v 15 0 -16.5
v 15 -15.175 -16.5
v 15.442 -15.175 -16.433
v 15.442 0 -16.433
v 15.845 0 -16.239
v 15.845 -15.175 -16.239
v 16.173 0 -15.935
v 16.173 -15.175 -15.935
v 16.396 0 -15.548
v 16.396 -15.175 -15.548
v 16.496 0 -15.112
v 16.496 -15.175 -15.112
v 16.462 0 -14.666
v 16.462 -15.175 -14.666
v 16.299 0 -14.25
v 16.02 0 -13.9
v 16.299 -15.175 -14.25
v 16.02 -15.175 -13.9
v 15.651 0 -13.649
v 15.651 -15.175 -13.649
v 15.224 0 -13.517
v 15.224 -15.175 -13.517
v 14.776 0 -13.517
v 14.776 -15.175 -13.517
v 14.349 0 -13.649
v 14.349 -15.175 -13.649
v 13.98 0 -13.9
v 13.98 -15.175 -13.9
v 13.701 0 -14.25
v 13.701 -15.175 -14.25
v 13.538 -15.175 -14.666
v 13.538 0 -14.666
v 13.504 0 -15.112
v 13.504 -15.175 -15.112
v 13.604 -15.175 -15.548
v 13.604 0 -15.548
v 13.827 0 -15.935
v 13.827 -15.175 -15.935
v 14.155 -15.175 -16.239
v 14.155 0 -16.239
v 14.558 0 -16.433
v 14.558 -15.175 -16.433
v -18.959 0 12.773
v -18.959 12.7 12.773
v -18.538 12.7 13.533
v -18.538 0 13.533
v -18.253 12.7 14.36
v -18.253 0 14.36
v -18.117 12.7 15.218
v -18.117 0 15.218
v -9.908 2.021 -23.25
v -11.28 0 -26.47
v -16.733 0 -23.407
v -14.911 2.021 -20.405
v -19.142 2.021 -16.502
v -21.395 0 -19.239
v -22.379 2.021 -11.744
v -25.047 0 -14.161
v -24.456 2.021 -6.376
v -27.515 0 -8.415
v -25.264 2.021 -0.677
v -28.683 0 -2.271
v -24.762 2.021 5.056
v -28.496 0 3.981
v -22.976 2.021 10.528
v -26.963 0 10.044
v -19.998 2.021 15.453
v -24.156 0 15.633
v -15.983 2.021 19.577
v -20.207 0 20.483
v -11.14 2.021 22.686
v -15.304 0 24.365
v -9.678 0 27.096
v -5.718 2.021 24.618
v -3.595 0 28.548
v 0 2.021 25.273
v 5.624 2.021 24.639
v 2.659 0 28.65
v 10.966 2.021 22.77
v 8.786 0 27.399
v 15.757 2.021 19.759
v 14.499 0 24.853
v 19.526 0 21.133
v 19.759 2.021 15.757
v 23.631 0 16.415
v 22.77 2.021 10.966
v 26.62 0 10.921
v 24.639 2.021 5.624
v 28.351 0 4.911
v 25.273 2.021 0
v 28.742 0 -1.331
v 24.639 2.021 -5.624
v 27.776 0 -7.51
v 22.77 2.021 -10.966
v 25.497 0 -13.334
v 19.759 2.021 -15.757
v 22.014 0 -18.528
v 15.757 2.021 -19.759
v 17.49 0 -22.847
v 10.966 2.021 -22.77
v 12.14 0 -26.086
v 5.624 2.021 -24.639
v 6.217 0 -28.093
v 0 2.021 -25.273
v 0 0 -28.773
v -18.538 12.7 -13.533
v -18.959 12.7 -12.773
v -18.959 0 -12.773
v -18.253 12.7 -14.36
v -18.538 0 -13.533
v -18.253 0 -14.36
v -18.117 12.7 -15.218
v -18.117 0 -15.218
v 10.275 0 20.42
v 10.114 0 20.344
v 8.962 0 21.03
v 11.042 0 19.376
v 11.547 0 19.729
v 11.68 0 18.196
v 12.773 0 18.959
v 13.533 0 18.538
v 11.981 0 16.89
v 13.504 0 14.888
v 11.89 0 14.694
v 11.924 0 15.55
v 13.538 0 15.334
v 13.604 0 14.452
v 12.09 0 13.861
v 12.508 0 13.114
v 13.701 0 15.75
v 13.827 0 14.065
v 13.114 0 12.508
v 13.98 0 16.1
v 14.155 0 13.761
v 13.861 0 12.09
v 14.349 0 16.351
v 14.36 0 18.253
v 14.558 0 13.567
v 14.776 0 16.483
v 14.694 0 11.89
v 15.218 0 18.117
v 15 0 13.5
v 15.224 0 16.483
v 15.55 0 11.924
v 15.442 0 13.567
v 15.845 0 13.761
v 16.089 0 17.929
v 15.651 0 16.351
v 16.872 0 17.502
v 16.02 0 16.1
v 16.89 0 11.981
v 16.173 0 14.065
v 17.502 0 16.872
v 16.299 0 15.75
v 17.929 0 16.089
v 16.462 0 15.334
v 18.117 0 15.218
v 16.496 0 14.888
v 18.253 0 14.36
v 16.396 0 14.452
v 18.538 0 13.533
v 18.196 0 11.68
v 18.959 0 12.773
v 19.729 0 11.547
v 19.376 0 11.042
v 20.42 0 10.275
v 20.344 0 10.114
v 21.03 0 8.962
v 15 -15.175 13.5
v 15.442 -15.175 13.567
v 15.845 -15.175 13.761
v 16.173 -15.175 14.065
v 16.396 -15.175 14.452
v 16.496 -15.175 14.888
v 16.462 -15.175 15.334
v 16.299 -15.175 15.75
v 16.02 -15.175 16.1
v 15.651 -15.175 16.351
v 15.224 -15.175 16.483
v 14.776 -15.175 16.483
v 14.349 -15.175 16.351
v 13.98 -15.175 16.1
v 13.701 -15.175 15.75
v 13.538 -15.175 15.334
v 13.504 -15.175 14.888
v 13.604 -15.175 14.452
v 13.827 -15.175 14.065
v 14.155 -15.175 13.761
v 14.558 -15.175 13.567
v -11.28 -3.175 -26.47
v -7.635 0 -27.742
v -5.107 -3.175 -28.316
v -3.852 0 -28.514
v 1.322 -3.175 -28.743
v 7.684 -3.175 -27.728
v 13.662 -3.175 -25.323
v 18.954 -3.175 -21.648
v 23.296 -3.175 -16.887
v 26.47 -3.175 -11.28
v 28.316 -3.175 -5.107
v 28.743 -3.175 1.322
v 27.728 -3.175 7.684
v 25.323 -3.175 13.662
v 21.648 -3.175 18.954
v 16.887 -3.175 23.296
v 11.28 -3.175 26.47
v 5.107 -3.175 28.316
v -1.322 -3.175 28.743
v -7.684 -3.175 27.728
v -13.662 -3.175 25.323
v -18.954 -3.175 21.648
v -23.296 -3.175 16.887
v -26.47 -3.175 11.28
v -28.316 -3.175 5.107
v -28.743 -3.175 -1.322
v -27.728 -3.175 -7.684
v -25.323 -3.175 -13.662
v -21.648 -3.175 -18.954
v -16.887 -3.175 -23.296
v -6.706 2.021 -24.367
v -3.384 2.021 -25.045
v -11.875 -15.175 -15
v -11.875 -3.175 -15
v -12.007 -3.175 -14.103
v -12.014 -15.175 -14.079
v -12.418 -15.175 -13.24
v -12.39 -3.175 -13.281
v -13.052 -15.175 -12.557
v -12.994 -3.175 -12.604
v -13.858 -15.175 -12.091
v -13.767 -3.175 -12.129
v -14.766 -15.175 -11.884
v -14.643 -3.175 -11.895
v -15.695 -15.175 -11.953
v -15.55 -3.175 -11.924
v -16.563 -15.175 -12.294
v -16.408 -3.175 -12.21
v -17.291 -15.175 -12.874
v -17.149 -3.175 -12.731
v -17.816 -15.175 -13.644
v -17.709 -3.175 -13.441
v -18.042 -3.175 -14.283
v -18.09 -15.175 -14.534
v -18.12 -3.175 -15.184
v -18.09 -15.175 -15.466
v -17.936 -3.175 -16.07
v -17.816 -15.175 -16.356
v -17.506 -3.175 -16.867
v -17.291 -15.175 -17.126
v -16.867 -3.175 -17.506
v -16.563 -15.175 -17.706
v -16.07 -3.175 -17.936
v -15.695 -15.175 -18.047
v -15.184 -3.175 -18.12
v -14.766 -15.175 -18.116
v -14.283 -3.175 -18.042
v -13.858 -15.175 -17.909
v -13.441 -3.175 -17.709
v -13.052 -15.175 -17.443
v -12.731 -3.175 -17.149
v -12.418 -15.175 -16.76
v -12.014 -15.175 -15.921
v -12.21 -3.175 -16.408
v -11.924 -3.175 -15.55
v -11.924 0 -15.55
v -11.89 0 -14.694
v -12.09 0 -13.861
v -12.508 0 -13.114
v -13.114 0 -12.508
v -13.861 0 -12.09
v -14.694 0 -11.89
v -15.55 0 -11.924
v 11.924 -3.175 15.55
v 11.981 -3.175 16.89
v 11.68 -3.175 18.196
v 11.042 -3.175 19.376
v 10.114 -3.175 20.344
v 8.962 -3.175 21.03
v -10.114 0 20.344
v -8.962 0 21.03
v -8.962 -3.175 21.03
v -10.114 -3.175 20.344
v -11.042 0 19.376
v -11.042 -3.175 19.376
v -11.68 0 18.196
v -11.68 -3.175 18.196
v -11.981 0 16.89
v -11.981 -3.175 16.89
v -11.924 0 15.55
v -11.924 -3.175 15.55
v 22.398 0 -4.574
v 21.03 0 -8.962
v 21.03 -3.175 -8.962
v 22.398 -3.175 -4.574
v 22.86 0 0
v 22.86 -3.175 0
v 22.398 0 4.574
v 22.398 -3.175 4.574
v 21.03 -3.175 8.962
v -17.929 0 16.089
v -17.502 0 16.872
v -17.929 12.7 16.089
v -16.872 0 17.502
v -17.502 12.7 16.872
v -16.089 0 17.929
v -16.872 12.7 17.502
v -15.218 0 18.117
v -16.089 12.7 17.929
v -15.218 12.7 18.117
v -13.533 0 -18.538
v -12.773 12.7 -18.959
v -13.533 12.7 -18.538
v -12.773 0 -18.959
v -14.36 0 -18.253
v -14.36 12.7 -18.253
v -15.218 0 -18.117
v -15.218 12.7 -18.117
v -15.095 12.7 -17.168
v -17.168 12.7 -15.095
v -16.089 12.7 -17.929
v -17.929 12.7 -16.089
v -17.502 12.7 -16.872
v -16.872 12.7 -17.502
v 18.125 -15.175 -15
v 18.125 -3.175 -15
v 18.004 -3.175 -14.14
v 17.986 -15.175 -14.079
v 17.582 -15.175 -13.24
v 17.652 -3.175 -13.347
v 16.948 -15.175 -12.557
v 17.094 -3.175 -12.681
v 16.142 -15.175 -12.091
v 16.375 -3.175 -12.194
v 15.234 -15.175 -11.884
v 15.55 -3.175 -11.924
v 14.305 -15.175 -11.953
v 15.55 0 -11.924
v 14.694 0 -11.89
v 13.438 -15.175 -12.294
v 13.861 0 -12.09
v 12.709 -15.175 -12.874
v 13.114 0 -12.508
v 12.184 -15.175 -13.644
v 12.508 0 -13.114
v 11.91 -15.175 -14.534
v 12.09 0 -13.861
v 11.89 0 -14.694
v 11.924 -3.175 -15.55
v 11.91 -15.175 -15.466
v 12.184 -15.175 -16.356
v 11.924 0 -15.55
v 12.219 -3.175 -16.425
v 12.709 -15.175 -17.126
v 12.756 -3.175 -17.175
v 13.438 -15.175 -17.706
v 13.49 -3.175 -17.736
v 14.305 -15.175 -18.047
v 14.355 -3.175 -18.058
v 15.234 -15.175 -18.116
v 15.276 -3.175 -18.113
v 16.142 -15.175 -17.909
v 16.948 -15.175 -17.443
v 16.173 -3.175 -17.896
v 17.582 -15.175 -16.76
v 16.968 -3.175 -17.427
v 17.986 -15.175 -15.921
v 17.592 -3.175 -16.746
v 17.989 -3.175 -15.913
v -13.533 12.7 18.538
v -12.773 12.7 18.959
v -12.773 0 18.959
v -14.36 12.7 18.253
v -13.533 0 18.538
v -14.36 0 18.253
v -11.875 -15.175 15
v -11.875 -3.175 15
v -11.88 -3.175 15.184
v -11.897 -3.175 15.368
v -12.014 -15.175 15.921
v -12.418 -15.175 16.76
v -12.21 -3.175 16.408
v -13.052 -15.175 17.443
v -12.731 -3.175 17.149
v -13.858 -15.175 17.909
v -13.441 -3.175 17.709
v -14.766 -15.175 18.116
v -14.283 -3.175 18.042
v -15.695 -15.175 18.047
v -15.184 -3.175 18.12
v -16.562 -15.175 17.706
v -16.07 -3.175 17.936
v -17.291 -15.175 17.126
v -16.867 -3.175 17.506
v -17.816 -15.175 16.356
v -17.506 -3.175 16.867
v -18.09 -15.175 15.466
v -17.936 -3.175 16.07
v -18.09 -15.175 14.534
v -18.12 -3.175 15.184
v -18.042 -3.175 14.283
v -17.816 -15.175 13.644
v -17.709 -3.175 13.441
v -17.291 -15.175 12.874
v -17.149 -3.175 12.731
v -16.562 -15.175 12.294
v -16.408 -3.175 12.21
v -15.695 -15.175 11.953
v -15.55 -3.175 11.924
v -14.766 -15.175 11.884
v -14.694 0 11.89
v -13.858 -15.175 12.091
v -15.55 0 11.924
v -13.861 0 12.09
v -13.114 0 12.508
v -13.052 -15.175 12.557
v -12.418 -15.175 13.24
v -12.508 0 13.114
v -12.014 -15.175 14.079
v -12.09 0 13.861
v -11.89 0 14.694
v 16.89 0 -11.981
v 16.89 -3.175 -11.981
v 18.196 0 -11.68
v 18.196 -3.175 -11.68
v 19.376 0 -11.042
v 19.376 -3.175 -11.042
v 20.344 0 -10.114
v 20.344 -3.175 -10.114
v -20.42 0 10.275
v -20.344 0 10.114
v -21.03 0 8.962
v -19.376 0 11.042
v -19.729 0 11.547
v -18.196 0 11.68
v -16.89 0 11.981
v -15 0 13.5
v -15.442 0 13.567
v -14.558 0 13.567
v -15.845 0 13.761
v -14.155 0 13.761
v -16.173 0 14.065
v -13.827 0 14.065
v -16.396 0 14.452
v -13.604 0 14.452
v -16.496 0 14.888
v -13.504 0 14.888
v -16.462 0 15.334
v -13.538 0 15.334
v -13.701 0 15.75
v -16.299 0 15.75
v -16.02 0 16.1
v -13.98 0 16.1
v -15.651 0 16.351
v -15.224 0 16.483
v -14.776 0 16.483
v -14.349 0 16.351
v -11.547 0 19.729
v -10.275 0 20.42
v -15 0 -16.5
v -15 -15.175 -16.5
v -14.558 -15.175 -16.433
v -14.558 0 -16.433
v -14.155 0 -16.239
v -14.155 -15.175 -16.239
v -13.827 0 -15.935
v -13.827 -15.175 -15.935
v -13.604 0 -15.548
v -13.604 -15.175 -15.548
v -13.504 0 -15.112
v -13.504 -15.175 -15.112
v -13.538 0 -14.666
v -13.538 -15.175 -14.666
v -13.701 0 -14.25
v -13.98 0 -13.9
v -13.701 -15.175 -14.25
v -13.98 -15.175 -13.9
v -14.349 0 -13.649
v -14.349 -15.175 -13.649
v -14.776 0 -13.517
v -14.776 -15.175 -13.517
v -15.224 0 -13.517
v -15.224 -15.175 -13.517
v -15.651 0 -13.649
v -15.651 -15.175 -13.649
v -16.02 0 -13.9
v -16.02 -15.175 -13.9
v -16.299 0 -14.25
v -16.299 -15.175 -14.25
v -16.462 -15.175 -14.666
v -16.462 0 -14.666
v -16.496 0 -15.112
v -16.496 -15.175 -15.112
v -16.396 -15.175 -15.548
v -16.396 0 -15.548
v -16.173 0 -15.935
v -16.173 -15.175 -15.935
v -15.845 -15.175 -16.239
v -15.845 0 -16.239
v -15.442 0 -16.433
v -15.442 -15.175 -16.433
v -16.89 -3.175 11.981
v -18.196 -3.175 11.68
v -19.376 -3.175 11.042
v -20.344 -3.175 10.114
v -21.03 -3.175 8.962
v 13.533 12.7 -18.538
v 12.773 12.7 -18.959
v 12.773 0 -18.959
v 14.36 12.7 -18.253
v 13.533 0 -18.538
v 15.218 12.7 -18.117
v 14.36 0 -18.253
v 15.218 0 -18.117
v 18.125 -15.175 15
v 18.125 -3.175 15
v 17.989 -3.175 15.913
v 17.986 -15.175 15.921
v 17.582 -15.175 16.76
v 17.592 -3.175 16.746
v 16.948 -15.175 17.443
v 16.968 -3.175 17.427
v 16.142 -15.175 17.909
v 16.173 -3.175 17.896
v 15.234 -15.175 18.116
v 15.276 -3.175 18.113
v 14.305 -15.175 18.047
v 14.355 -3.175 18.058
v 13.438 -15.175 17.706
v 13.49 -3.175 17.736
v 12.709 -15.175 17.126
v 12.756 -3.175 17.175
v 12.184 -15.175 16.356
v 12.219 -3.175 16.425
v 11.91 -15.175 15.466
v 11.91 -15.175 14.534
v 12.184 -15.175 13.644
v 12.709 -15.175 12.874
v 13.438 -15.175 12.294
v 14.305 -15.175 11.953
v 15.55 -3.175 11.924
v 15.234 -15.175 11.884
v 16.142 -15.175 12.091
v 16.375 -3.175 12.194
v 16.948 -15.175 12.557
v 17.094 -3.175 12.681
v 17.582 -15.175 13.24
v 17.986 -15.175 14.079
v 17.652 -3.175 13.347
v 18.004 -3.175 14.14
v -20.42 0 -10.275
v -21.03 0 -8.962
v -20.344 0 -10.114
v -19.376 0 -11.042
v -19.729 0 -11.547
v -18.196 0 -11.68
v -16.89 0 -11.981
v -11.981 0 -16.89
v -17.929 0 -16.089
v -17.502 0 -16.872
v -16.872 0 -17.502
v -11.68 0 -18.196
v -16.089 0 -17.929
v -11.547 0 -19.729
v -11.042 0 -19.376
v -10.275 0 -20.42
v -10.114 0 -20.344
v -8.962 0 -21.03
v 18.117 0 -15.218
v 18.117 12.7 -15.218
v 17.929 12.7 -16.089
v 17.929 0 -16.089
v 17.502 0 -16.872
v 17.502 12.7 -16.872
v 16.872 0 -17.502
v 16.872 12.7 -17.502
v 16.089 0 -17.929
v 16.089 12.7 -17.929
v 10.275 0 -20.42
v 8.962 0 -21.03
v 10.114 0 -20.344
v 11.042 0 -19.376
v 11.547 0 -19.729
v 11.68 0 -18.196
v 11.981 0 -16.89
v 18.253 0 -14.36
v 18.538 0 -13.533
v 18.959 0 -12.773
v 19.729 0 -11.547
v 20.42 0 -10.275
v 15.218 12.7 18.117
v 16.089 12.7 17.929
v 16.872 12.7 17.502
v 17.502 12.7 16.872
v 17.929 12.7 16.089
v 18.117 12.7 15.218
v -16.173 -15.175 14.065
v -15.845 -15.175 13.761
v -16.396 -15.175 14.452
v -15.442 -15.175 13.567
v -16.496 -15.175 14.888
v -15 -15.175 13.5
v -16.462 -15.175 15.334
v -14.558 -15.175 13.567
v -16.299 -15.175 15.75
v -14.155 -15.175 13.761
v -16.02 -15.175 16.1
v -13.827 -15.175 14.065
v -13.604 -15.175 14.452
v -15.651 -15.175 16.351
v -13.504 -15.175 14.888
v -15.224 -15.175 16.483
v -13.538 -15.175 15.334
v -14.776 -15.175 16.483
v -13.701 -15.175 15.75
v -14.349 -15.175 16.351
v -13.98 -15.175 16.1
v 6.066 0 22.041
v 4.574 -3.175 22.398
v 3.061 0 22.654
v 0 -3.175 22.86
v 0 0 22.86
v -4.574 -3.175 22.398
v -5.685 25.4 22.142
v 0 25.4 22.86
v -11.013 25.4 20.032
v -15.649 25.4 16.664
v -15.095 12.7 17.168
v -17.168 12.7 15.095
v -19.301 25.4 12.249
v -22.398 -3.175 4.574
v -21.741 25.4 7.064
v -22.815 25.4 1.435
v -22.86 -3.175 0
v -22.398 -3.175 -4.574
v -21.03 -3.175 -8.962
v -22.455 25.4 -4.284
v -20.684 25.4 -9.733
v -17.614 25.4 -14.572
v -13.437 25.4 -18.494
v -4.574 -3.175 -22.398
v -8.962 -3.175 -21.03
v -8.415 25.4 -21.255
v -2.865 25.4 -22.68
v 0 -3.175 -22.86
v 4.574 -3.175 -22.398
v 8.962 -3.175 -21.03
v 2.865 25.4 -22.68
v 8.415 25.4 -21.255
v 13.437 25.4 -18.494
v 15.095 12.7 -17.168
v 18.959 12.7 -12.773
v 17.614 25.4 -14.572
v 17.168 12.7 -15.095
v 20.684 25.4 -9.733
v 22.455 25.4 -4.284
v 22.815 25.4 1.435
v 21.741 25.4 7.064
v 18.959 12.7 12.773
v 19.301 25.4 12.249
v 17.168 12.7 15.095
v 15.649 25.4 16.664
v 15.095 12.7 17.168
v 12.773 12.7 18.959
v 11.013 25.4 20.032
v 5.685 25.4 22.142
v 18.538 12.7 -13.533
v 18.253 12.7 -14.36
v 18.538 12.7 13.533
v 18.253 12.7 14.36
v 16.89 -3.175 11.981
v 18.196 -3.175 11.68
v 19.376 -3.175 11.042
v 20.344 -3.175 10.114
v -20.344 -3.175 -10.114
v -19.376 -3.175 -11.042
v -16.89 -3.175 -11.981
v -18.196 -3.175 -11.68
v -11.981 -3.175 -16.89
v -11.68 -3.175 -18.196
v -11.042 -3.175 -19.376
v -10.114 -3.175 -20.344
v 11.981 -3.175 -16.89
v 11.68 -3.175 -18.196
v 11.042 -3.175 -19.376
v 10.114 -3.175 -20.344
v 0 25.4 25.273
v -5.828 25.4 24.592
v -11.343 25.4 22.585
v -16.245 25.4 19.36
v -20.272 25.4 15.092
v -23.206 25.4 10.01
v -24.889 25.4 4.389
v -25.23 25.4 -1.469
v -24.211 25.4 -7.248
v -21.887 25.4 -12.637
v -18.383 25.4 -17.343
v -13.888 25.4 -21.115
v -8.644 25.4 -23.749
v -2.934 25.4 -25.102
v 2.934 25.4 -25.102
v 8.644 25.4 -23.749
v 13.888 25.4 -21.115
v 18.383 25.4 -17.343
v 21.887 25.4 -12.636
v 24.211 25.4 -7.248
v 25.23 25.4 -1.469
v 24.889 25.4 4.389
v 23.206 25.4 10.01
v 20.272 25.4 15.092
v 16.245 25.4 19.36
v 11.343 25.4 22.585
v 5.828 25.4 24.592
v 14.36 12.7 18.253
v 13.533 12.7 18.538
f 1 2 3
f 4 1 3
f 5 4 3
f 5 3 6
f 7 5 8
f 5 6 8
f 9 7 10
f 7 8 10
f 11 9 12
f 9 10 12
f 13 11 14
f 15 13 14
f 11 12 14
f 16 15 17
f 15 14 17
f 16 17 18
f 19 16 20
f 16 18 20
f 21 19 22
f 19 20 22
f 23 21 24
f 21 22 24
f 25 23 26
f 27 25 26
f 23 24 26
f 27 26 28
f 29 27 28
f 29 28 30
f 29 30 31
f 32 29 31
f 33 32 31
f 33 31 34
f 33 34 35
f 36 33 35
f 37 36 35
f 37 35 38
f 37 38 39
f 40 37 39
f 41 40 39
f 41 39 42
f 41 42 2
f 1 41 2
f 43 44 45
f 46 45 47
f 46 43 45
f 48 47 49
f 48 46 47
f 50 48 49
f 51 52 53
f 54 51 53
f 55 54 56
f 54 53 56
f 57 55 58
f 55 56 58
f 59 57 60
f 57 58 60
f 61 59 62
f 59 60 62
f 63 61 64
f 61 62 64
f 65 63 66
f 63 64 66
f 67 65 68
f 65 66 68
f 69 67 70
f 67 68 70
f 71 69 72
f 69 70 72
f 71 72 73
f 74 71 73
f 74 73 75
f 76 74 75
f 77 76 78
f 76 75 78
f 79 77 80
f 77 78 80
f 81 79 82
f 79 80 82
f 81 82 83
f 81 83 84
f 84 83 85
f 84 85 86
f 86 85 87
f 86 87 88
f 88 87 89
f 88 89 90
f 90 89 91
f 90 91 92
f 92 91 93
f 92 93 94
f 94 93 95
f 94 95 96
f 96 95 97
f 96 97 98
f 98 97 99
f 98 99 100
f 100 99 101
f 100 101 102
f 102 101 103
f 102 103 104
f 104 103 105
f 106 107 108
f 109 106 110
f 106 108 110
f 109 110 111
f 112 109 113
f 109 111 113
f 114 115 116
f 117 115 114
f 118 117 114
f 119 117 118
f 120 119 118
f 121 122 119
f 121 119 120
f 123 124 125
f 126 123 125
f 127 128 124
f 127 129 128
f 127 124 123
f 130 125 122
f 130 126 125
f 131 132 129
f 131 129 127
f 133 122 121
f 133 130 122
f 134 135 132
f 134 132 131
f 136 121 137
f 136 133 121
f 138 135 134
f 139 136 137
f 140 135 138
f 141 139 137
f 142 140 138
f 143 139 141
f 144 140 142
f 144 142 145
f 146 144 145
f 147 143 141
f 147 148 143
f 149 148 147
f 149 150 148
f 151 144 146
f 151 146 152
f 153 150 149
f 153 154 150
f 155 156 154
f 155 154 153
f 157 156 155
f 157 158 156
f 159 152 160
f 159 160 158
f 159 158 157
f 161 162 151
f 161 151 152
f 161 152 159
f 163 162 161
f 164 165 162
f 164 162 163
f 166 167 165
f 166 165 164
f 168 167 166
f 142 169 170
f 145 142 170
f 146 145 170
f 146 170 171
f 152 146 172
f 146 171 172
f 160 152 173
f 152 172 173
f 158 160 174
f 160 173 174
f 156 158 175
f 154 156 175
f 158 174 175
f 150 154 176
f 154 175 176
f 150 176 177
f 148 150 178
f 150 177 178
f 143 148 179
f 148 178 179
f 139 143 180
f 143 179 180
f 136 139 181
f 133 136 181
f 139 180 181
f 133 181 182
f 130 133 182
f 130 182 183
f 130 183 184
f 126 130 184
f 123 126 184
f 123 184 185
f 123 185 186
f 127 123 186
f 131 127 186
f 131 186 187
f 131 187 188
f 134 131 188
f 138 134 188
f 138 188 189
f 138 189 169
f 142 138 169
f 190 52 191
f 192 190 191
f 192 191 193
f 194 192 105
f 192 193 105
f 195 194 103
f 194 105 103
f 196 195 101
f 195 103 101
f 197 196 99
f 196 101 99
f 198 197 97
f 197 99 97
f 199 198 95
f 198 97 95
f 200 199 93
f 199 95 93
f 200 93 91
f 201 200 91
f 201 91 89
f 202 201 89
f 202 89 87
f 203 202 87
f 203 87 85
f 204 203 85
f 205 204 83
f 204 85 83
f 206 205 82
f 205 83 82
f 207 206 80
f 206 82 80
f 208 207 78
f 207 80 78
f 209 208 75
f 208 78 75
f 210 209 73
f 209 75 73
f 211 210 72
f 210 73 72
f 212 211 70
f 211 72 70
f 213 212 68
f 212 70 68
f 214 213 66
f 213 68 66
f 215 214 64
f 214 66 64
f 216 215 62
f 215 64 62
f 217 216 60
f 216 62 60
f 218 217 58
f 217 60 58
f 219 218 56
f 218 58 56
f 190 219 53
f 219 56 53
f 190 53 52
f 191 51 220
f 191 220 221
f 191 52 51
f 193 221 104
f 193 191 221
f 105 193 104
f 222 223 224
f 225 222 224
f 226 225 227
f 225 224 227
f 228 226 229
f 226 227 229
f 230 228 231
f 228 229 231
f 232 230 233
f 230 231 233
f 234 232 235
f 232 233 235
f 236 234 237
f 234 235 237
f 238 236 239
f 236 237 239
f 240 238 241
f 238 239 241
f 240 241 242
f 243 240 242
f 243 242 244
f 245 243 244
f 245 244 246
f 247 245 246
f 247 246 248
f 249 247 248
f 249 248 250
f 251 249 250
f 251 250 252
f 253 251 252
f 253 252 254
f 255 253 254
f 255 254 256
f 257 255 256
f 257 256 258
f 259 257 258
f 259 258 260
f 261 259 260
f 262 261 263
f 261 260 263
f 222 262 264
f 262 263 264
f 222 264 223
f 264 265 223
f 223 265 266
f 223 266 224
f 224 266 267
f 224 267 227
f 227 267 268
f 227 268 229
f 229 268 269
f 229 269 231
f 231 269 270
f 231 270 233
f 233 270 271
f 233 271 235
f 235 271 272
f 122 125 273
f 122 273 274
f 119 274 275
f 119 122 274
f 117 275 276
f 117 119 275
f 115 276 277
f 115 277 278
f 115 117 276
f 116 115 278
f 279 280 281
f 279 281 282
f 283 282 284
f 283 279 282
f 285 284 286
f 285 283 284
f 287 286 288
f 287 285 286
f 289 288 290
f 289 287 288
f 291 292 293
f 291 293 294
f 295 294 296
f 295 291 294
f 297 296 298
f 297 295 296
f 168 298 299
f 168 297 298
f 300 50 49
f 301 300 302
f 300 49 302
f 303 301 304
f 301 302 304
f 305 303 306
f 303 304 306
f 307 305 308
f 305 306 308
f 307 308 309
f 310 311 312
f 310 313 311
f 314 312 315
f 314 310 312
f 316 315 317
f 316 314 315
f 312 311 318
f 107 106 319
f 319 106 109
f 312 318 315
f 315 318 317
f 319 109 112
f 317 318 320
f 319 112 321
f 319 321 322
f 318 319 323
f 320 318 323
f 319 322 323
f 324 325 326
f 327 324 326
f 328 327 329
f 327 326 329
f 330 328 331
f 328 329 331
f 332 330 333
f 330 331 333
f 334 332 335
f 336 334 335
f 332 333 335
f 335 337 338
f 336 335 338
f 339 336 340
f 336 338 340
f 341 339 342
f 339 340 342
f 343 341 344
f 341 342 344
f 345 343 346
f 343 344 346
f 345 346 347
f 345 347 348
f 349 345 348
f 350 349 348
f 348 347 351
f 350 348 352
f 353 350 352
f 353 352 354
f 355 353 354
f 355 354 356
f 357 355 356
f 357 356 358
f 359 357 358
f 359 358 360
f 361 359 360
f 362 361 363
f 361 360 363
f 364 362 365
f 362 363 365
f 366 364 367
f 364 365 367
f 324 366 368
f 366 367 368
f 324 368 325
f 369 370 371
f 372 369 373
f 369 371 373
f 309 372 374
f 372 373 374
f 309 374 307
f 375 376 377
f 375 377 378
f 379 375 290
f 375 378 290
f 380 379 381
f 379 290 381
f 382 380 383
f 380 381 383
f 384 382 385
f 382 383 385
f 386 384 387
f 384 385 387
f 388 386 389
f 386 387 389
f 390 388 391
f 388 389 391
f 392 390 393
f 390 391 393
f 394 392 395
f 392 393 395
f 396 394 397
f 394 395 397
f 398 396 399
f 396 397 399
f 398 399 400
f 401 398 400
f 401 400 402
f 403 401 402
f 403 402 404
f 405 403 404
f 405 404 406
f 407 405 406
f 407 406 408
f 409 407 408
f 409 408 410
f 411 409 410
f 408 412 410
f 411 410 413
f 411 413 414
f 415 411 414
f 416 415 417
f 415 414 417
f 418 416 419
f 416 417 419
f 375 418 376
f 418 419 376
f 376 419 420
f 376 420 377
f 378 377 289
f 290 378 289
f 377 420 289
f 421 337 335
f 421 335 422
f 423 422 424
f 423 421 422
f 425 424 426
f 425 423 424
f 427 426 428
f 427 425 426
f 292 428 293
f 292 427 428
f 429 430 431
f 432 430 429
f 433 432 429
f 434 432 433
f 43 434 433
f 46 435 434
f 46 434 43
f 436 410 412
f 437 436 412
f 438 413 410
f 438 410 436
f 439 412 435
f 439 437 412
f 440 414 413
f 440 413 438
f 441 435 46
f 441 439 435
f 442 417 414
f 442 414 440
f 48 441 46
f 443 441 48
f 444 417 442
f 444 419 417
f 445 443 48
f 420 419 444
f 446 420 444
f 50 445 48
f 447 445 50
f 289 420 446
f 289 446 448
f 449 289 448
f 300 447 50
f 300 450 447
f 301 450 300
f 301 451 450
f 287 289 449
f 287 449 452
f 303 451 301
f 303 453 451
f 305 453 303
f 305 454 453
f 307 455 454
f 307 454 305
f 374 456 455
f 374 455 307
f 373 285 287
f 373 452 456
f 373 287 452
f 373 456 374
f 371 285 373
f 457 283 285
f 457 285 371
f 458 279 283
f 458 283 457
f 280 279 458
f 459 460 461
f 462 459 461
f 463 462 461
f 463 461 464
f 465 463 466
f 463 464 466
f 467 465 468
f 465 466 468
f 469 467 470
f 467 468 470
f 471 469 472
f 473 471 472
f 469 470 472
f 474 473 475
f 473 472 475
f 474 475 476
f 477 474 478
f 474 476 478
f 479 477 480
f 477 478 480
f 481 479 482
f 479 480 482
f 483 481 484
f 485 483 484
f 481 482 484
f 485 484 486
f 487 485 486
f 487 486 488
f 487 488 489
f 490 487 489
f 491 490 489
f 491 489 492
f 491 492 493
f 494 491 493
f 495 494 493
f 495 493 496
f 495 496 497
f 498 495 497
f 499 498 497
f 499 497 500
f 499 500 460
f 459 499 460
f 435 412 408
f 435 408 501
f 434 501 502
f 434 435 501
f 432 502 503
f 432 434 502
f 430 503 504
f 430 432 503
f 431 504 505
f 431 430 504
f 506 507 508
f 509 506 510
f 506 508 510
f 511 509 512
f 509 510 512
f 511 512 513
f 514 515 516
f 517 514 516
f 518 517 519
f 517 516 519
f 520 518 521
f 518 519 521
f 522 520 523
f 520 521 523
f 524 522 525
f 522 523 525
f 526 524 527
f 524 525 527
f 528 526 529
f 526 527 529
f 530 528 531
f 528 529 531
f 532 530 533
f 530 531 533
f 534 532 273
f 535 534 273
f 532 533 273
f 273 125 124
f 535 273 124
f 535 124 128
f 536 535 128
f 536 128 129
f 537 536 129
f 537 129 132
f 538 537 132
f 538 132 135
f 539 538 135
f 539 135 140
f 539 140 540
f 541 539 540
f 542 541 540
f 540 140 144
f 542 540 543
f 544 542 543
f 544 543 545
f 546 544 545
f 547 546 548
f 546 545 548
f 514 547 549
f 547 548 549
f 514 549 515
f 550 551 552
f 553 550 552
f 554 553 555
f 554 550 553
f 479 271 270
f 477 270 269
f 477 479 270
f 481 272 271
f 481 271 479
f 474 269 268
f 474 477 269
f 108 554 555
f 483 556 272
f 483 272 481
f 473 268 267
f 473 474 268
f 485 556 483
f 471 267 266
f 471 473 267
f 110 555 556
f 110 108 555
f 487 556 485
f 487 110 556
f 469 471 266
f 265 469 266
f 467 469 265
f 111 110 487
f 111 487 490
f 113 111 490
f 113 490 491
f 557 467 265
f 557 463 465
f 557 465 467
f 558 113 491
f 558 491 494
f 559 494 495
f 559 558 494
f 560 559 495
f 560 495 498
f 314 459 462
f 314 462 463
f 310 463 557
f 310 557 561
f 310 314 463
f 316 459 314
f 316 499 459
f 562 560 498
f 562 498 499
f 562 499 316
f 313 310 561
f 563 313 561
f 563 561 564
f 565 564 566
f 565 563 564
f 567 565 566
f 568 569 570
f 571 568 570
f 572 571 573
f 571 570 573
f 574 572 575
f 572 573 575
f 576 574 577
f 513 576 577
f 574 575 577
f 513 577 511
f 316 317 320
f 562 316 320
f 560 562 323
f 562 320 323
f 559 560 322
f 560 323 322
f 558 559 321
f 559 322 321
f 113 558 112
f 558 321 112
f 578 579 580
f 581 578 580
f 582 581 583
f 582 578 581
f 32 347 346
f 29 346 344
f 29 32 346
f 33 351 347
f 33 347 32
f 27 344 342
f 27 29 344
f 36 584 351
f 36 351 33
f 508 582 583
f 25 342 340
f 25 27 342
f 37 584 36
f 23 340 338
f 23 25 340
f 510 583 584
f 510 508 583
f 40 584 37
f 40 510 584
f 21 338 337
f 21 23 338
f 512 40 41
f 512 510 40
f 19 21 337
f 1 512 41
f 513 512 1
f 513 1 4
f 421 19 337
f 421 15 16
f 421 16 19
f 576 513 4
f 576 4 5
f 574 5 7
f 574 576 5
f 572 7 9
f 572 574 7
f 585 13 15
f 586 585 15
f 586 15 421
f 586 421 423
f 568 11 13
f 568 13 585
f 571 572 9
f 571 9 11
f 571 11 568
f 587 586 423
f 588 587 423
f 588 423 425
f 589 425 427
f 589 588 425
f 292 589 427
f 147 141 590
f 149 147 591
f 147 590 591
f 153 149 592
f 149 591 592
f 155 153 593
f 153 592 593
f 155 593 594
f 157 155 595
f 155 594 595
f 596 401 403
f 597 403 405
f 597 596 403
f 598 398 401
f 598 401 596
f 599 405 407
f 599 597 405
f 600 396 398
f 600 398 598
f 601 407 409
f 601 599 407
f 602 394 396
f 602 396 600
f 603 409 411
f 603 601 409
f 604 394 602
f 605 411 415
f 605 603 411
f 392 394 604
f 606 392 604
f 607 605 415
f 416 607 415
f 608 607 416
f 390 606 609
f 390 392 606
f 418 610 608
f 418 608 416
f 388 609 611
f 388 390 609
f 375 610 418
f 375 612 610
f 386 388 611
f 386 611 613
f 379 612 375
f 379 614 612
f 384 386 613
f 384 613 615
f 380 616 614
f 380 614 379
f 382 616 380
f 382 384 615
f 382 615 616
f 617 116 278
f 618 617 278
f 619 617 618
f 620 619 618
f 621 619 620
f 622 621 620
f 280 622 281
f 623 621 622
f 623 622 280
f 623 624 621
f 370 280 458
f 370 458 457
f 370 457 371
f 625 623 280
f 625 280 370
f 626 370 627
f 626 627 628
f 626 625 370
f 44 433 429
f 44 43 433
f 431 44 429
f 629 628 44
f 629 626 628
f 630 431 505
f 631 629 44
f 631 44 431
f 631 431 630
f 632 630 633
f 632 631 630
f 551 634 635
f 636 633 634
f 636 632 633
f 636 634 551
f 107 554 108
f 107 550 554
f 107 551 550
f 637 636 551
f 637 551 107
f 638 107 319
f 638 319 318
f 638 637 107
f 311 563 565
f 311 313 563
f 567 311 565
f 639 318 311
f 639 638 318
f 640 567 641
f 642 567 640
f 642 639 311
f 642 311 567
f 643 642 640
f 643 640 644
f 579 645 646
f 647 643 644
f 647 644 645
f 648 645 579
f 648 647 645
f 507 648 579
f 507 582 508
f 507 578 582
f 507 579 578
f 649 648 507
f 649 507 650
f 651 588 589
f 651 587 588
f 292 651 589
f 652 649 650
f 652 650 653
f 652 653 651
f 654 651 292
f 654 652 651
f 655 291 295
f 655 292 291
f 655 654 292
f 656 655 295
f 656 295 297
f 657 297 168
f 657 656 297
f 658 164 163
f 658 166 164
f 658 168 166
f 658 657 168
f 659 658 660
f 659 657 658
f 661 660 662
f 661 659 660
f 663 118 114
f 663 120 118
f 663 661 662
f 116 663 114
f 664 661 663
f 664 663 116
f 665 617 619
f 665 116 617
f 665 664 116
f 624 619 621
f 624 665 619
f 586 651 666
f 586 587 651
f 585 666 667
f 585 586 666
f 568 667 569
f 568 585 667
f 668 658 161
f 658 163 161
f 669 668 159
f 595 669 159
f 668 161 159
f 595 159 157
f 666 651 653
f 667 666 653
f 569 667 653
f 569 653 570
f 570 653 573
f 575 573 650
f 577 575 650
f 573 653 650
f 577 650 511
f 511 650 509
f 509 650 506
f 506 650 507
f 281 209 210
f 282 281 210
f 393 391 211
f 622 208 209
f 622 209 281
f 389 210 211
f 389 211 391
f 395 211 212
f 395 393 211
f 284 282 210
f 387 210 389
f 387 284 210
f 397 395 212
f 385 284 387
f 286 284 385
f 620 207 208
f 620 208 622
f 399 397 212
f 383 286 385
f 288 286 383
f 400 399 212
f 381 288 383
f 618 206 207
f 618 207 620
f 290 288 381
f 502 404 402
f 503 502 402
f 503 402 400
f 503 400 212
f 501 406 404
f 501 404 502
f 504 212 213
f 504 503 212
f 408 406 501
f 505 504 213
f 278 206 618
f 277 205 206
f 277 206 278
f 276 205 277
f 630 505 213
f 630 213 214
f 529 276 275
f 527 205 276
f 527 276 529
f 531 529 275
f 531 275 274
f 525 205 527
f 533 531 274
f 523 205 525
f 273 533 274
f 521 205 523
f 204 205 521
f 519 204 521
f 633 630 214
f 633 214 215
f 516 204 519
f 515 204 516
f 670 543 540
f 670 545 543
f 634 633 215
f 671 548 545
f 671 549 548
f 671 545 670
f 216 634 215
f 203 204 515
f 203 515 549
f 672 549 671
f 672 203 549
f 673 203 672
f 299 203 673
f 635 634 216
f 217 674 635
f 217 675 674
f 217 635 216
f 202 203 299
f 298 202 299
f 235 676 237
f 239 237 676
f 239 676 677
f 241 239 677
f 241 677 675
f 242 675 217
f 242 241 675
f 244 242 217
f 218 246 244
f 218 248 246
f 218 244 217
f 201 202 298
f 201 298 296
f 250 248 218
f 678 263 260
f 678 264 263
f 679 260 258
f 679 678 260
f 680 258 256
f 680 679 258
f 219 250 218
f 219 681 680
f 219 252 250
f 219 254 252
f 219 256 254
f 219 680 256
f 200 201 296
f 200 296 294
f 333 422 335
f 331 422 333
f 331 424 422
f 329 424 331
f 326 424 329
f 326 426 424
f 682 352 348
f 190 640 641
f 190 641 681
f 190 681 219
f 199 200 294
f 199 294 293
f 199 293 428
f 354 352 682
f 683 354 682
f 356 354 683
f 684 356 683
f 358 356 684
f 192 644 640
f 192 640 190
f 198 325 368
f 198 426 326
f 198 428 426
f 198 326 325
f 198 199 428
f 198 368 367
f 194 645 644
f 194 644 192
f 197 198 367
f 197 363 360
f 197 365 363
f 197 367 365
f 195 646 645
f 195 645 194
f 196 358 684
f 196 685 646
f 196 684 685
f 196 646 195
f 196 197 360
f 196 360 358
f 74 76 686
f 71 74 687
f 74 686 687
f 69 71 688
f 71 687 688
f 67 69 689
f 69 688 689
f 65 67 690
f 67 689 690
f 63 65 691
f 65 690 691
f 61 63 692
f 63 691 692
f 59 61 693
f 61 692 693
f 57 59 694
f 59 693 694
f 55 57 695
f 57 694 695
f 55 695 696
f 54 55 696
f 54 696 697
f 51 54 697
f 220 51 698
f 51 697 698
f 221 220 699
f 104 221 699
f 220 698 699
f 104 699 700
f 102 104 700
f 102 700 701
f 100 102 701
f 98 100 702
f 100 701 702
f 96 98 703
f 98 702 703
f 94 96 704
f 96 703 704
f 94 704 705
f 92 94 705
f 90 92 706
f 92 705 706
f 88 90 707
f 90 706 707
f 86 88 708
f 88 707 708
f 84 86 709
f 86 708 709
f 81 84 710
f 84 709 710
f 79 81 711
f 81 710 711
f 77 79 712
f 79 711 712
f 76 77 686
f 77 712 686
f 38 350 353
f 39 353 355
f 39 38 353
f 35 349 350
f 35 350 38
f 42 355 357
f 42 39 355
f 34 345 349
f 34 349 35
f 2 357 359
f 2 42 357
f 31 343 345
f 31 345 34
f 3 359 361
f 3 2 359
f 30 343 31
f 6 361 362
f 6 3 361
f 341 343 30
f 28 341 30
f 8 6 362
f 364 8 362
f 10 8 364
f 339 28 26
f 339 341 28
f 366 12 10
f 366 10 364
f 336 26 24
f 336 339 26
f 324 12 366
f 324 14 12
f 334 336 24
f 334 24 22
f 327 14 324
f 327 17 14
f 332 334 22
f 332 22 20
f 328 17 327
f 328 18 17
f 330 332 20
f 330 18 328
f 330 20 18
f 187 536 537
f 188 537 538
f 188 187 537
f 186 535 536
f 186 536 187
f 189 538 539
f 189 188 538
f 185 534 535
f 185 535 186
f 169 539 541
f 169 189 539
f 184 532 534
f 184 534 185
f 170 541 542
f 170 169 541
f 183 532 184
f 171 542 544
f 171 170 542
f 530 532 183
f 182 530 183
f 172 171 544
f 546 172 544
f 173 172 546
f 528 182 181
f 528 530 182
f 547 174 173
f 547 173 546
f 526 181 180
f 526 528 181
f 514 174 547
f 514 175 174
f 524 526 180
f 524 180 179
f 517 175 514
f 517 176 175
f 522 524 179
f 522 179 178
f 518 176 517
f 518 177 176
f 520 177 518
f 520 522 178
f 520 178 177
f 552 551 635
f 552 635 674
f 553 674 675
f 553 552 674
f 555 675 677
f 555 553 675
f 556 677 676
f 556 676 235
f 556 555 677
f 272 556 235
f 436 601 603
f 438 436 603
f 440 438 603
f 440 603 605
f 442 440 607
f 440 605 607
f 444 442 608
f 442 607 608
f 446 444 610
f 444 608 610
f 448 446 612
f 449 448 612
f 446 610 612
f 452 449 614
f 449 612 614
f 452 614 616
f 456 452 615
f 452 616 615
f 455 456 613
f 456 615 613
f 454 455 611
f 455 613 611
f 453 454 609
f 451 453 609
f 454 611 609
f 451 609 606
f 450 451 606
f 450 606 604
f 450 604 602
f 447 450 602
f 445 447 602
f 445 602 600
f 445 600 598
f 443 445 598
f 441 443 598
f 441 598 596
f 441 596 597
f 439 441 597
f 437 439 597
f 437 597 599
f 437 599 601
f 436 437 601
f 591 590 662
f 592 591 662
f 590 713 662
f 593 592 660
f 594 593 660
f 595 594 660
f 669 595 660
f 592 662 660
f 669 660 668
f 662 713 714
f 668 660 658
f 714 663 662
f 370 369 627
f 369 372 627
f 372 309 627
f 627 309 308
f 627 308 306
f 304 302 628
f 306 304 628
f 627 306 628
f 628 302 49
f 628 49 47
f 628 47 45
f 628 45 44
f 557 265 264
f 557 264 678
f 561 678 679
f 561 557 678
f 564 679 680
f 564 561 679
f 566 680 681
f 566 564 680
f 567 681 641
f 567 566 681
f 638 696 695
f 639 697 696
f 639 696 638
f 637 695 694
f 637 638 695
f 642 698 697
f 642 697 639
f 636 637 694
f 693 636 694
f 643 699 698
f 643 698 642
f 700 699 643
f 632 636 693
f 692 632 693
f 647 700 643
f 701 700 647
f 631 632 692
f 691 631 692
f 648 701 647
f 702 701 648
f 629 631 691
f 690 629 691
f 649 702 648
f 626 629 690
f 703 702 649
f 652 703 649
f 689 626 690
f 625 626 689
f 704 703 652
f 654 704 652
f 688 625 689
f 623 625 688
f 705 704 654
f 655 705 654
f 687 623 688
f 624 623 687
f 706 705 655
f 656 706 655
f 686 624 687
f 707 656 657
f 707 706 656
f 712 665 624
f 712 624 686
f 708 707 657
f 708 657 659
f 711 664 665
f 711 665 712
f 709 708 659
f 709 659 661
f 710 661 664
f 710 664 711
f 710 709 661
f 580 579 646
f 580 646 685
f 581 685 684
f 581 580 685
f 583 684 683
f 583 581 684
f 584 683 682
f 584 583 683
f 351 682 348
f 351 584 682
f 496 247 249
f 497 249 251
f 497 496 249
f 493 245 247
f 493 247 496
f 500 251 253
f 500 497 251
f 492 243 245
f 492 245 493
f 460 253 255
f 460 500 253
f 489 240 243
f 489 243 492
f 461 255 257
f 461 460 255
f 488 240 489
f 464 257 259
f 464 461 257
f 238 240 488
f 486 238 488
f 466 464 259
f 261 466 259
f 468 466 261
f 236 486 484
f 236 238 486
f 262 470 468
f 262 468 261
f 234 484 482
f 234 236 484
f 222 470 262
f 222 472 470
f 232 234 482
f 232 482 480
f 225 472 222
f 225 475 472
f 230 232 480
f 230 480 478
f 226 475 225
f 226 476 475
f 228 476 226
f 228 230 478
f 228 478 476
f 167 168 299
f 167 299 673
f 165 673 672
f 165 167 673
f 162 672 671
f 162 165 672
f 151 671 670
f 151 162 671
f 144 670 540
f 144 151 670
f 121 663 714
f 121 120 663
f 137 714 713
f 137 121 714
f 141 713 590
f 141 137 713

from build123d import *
from build123d.topology import SkipClean

# Parameters (mm, degrees)
SKETCH1_R               = 25.273
SKETCH1_R_2             = 22.86
BOSS_EXTRUDE1_DEPTH     = 25.4
SKETCH6_R               = 3.1250000000000004
SKETCH6_R_2             = 3.125000000000001
SKETCH6_R_3             = 3.125000000000005
BOSS_EXTRUDE2_DEPTH     = 3.175
SKETCH5_R               = 3.1250000000000004
SKETCH5_R_2             = 3.125000000000004
SKETCH5_R_3             = 3.125000000000001
CUT_EXTRUDE1_DEPTH      = 12.7
SKETCH10_R              = 25.273
BOSS_EXTRUDE3_DEPTH     = 3.175
CUT_EXTRUDE2_DEPTH      = 44.84756615822593
CUT_EXTRUDE2_DEPTH_BACK = 44.84756615822593
SKETCH3_R               = 1.2500000000000007
FILLET1_R               = 5
FILLET3_R               = 5
SKETCH11_R              = 1.2500000000000013
BOSS_EXTRUDE4_DEPTH     = 12
SKETCH13_R              = 1.5000000000000009
SKETCH13_R_2            = 1.5000000000000002
CUT_EXTRUDE3_DEPTH      = 55.07198619539511
SKETCH14_W              = 3.5
SKETCH14_H              = 3.174999999999997
CHAMFER1_SIZE           = 2.020725942
CHAMFER1_SIZE_2         = 3.5


with BuildPart() as part:
    # Sketch1 → Boss-Extrude1 (new body)
    with BuildSketch(Plane(origin=(0, 0, 0), x_dir=(1, 0, 0), z_dir=(0, 1, 0))):
        with Locations(Location((0, 0, 0), (0, 0, 270))):
            Circle(SKETCH1_R)
        with Locations(Location((0, 0, 0), (0, 0, 270))):
            Circle(SKETCH1_R_2, mode=Mode.SUBTRACT)
    extrude(amount=BOSS_EXTRUDE1_DEPTH)

    # Sketch6 → Boss-Extrude2 (add)
    with BuildSketch(Plane.XZ):
        with Locations(Location((-15.000000000000004, 15, 0), (0, 0, 73.279468642))):
            Circle(SKETCH6_R)
        with Locations(Location((-14.999999999999996, -15.000000000000007, 0), (0, 0, 163.279468642))):
            Circle(SKETCH6_R_2)
        with Locations(Location((15.00000000000001, -14.999999999999993, 0), (0, 0, 16.720531358))):
            Circle(SKETCH6_R)
        with Locations(Location((15.000000000000004, 15, 0), (0, 0, 106.720531358))):
            Circle(SKETCH6_R_3)
    extrude(amount=BOSS_EXTRUDE2_DEPTH)

    # Sketch5 → Cut-Extrude1 (cut)
    with BuildSketch(Plane(origin=(0, 12.7, 0), x_dir=(1, 0, 0), z_dir=(0, 1, 0))):
        with Locations(Location((-14.999999999999996, 15.000000000000007, 0), (0, 0, 90))):
            Circle(SKETCH5_R)
        with Locations(Location((15.00000000000001, 14.999999999999993, 0), (0, 0, 90))):
            Circle(SKETCH5_R)
        with Locations(Location((15.000000000000004, -15, 0), (0, 0, 90))):
            Circle(SKETCH5_R_2)
        with Locations(Location((-15.000000000000004, -15, 0), (0, 0, 90))):
            Circle(SKETCH5_R_3)
    extrude(amount=-CUT_EXTRUDE1_DEPTH, mode=Mode.SUBTRACT)


with BuildPart() as cut_extrude1_piece_1:
    # of the separate pieces the step leaves, piece 1, a body of its own (cut_extrude1_pieces)
    add(part.part.solids().sort_by_distance((0, 0, 25.273))[0])



with BuildPart() as cut_extrude1_piece_2:
    # of the separate pieces the step leaves, piece 2, a body of its own (cut_extrude1_pieces)
    add(part.part.solids().sort_by_distance((14.100925852, -3.175, 17.992873315))[0])


with BuildPart() as cut_extrude1_piece_3:
    # of the separate pieces the step leaves, piece 3, a body of its own (cut_extrude1_pieces)
    add(part.part.solids().sort_by_distance((17.992873315, -3.175, -14.100925852))[0])


with BuildPart() as cut_extrude1_piece_4:
    # of the separate pieces the step leaves, piece 4, a body of its own (cut_extrude1_pieces)
    add(part.part.solids().sort_by_distance((-17.992873315, -3.175, -14.100925852))[0])


with BuildPart() as cut_extrude1_piece_5:
    # of the separate pieces the step leaves, piece 5, a body of its own (cut_extrude1_pieces)
    add(part.part.solids().sort_by_distance((-14.100925852, -3.175, 17.992873315))[0])


with BuildPart() as cut_extrude1_piece_1_1:
    with SkipClean():  # the faces are left unmerged after this step: merging them gives an invalid solid
        add(cut_extrude1_piece_1.part)

        add(cut_extrude1_piece_2.part)  # Boss-Extrude3 merges Cut-Extrude1 piece 2

        add(cut_extrude1_piece_3.part)  # Boss-Extrude3 merges Cut-Extrude1 piece 3

        add(cut_extrude1_piece_4.part)  # Boss-Extrude3 merges Cut-Extrude1 piece 4

        add(cut_extrude1_piece_5.part)  # Boss-Extrude3 merges Cut-Extrude1 piece 5
        # Sketch10 → Boss-Extrude3 (add)
        with BuildSketch(Plane.XZ):
            with Locations(Location((0, 0, 0), (0, 0, 270))):
                Circle(SKETCH10_R)
            with BuildLine():
                ThreePointArc((-17.992873314506625, 14.100925852160042), (-22.86, -7.35e-15), (-17.992873314506618, -14.100925852160044))
                ThreePointArc((-17.992873314506618, -14.100925852160044), (-17.209708691207958, -17.209708691207968), (-14.100925852160033, -17.992873314506628))
                ThreePointArc((-14.100925852160033, -17.992873314506628), (1.155e-14, -22.86), (14.10092585216005, -17.992873314506614))
                ThreePointArc((14.10092585216005, -17.992873314506614), (17.20970869120797, -17.209708691207954), (17.99287331450663, -14.10092585216003))
                ThreePointArc((17.99287331450663, -14.10092585216003), (22.86, 2.54e-15), (17.992873314506628, 14.100925852160033))
                ThreePointArc((17.992873314506628, 14.100925852160033), (17.209708691207968, 17.209708691207965), (14.100925852160037, 17.99287331450662))
                ThreePointArc((14.100925852160037, 17.99287331450662), (-8.75e-15, 22.859999999999996), (-14.10092585216005, 17.992873314506618))
                ThreePointArc((-14.10092585216005, 17.992873314506618), (-17.20970869120796, 17.209708691207958), (-17.992873314506625, 14.100925852160042))
            make_face(mode=Mode.SUBTRACT)
        extrude(amount=BOSS_EXTRUDE3_DEPTH)

    # Sketch3 → Cut-Extrude2 (cut, two sides: drawn at the far end of the back side and taken through both)
    with BuildSketch(Plane(origin=(0, 0, 0), x_dir=(-1, 0, 0), z_dir=(0, -1, 0)).offset(-CUT_EXTRUDE2_DEPTH_BACK)):
        with Locations(Location((-15.00000000000001, 14.999999999999993, 0), (0, 0, 90))):
            Circle(SKETCH3_R)
        with Locations(Location((14.999999999999996, 15.000000000000007, 0), (0, 0, 90))):
            Circle(SKETCH3_R)
        with Locations(Location((15.000000000000004, -15, 0), (0, 0, 90))):
            Circle(SKETCH3_R)
        with Locations(Location((-15.000000000000004, -15, 0), (0, 0, 90))):
            Circle(SKETCH3_R)
    extrude(amount=CUT_EXTRUDE2_DEPTH + CUT_EXTRUDE2_DEPTH_BACK, mode=Mode.SUBTRACT)

    # Fillet1
    # the kernel refuses this fillet: 5 mm, written as the material it adds along each edge
    with BuildSketch(Plane(origin=(14.10092585215273, 0, 17.99287331450443), x_dir=(-0.8608874223501668, 0, 0.5087954854745522), z_dir=(0, -1, 0))) as fillet1_piece_1:
        with BuildLine():
            CenterArc((5.3164306254297475, 4.957201606076887), FILLET1_R, 200.44493479768204, 77.05705788713391)
            ThreePointArc((0.631388974913585, 3.210666541175879), (0.7695099639794132, 1.5160888458409856), (0, 0))
            ThreePointArc((0, 0), (2.984616996499313, -0.19567425701646401), (5.969233992998208, 6e-17))
        make_face()
    extrude(amount=3.175)
    with BuildSketch(Plane(origin=(17.992873314504436, 0, -14.10092585215272), x_dir=(0.5087954854745508, 0, 0.8608874223501678), z_dir=(0, -1, 0))) as fillet1_piece_2:
        with BuildLine():
            CenterArc((5.316430625429749, 4.9572016060768895), FILLET1_R, 200.44493479768207, 77.05705788713385)
            ThreePointArc((0.6313889749135845, 3.2106665411758786), (0.7695099639794142, 1.5160888458409876), (0, 0))
            ThreePointArc((0, 0), (2.984616996499308, -0.19567425701646796), (5.9692339929982055, -1e-16))
        make_face()
    extrude(amount=3.175)
    with BuildSketch(Plane(origin=(-14.100925852160035, 0, -17.992873314506628), x_dir=(0.665348701330496, 0, 0.7465327224159852), z_dir=(0, -1, 0))) as fillet1_piece_3:
        with BuildLine():
            CenterArc((5.889888167974704, -4.259988230871161), FILLET1_R, 121.57038627249773, 77.05705788713396)
            ThreePointArc((1.1518105546258381, -5.857054456762352), (0.3839083174921323, -2.9662841122227417), (0, 0))
            ThreePointArc((0, 0), (1.6360800466596406, -0.46250735570552437), (3.2721600933192807, 3e-17))
        make_face()
    extrude(amount=3.175)
    with BuildSketch(Plane(origin=(-17.992873314506625, 0, 14.100925852160042), x_dir=(0.7465327224159842, 0, -0.6653487013304972), z_dir=(0, -1, 0))) as fillet1_piece_4:
        with BuildLine():
            CenterArc((5.889888167974704, -4.259988230871161), FILLET1_R, 121.57038627249773, 77.05705788713396)
            ThreePointArc((1.1518105546258386, -5.857054456762347), (0.38390831749212756, -2.96628411222273), (0, 0))
            ThreePointArc((0, 0), (1.6360800466596437, -0.4625073557055245), (3.2721600933192807, 8e-17))
        make_face()
    extrude(amount=3.175)
    with BuildSketch(Plane(origin=(17.99287331450663, 0, 14.100925852160035), x_dir=(-0.7465327224159862, 0, -0.665348701330495), z_dir=(0, -1, 0))) as fillet1_piece_5:
        with BuildLine():
            CenterArc((5.889888167974704, 4.2599882308711665), FILLET1_R, 161.3725558403684, 77.05705788713396)
            ThreePointArc((1.1518105546258386, 5.857054456762349), (0.38390831749213894, 2.9662841122227275), (0, 0))
            ThreePointArc((0, 0), (1.6360800466596428, 0.46250735570552437), (3.272160093319286, 6e-17))
        make_face()
    extrude(amount=3.175)
    with BuildSketch(Plane(origin=(-17.992873314504422, 0, -14.100925852152734), x_dir=(-0.5087954854745543, 0, 0.8608874223501657), z_dir=(0, -1, 0))) as fillet1_piece_6:
        with BuildLine():
            CenterArc((5.316430625429729, -4.957201606076887), FILLET1_R, 82.49800731518394, 77.05705788713391)
            ThreePointArc((0.631388974913567, -3.2106665411758706), (0.769509963979407, -1.5160888458409818), (0, 0))
            ThreePointArc((0, 0), (2.984616996499318, 0.19567425701647095), (5.969233992998199, -2.4e-16))
        make_face()
    extrude(amount=3.175)
    with BuildSketch(Plane(origin=(14.100925852160053, 0, -17.992873314506614), x_dir=(-0.860887422350645, 0, -0.5087954854737433), z_dir=(0, -1, 0))) as fillet1_piece_7:
        with BuildLine():
            CenterArc((5.31643062543959, -4.9572016060775015), FILLET1_R, 82.49800731523791, 77.05705788713382)
            ThreePointArc((0.631388974921786, -3.210666541180892), (0.7695099639852782, -1.5160888458421276), (0, 0))
            ThreePointArc((0, 0), (2.9846169965017046, 0.1956742570136652), (5.969233993003391, -1.1e-16))
        make_face()
    extrude(amount=3.175)
    with BuildSketch(Plane(origin=(-14.10092585215273, 0, 17.992873314504426), x_dir=(0.6653487013295846, 0, -0.7465327224167976), z_dir=(0, -1, 0))) as fillet1_piece_8:
        with BuildLine():
            CenterArc((5.889888167962995, 4.25998823087436), FILLET1_R, 161.3725558404384, 77.05705788713385)
            ThreePointArc((1.1518105546121764, 5.857054456759753), (0.38390831748250376, 2.9662841122217563), (0, 0))
            ThreePointArc((0, 0), (1.6360800466563894, 0.4625073557035249), (3.2721600933127744, -3e-17))
        make_face()
    extrude(amount=3.175)

    # Fillet3
    fillet3_edges = [cut_extrude1_piece_1_1.edges().sort_by_distance(p)[0] for p in [
        (17.99287331450661, 6.35, 14.100925852160058),
        (14.10092585216007, 6.35, -17.9928733145066),
        (-17.992873314506618, 6.349999999999999, -14.100925852160048),
        (14.100925852160062, 6.35, 17.992873314506607),
        (-14.100925852160064, 6.35, 17.992873314506603),
        (-14.100925852160053, 6.35, -17.992873314506614),
        (17.99287331450662, 6.35, -14.100925852160046),
        (-17.99287331450661, 6.35, 14.100925852160056),
    ]]
    fillet(fillet3_edges, radius=FILLET3_R)

    # Sketch11 → Boss-Extrude4 (add)
    # profile 1 of 4: a face of its own
    with SkipClean():  # the faces are left unmerged after this step: merging them gives an invalid solid
        with BuildSketch(Plane.XZ.offset(3.175)):
            with BuildLine():
                ThreePointArc((-15.550098731860036, 11.92379838352458), (-12.994187638020772, 12.60368162204366), (-11.875000000000004, 15))
                ThreePointArc((-11.875000000000004, 15), (-11.887223502121808, 15.276129451991556), (-11.923798383524584, 15.550098731860032))
                ThreePointArc((-11.923798383524584, 15.550098731860032), (-17.209708691207965, 17.20970869120796), (-15.550098731860036, 11.92379838352458))
            make_face()
            with Locations(Location((-15.000000000000004, 15, 0), (0, 0, 270))):
                Circle(SKETCH11_R, mode=Mode.SUBTRACT)
        # profile 2 of 4: a face of its own
        with BuildSketch(Plane.XZ.offset(3.175)):
            with BuildLine():
                ThreePointArc((15.550098731860036, 11.92379838352458), (17.39631837795634, 12.994187638020769), (18.125000000000004, 15))
                ThreePointArc((18.125000000000004, 15), (15.27612945199156, 18.112776497878194), (11.923798383524584, 15.550098731860034))
                ThreePointArc((11.923798383524579, 15.550098731860034), (12.790291308792039, 12.790291308792035), (15.550098731860038, 11.923798383524574))
            make_face()
            with Locations(Location((15.000000000000004, 15, 0), (0, 0, 270))):
                Circle(SKETCH11_R, mode=Mode.SUBTRACT)
        # profile 3 of 4: a face of its own
        with BuildSketch(Plane.XZ.offset(3.175)):
            with BuildLine():
                ThreePointArc((11.923798383524582, -15.550098731860029), (15.276129451991556, -18.112776497878198), (18.125000000000004, -15))
                ThreePointArc((18.125000000000004, -15), (17.396318377956344, -12.99418763802077), (15.55009873186004, -11.92379838352458))
                ThreePointArc((15.550098731860041, -11.923798383524572), (12.790291308792046, -12.790291308792032), (11.92379838352459, -15.550098731860029))
            make_face()
            with Locations(Location((15.000000000000004, -15, 0), (0, 0, 270))):
                Circle(SKETCH11_R, mode=Mode.SUBTRACT)
        # profile 4 of 4: a face of its own
        with BuildSketch(Plane.XZ.offset(3.175)):
            with BuildLine():
                ThreePointArc((-11.923798383524584, -15.55009873186004), (-11.887223502121808, -15.27612945199156), (-11.875000000000004, -15))
                ThreePointArc((-11.875000000000004, -15), (-12.99418763802077, -12.603681622043663), (-15.550098731860032, -11.923798383524579))
                ThreePointArc((-15.550098731860032, -11.923798383524579), (-17.209708691207968, -17.209708691207958), (-11.923798383524584, -15.55009873186004))
            make_face()
            with Locations(Location((-15.000000000000004, -15, 0), (0, 0, 270))):
                Circle(SKETCH11_R, mode=Mode.SUBTRACT)
        extrude(amount=BOSS_EXTRUDE4_DEPTH)

    # Sketch13 → Cut-Extrude3 (cut, through all)
    with SkipClean():  # the faces are left unmerged after this step: merging them gives an invalid solid
        with BuildSketch(Plane.XZ.offset(15.175)):
            with Locations(Location((-15.000000000000004, 15, 0), (0, 0, 270))):
                Circle(SKETCH13_R)
            with Locations(Location((15.000000000000004, 15, 0), (0, 0, 270))):
                Circle(SKETCH13_R_2)
            with Locations(Location((15.00000000000001, -14.999999999999993, 0), (0, 0, 270))):
                Circle(SKETCH13_R_2)
            with Locations(Location((-14.999999999999996, -15.000000000000007, 0), (0, 0, 270))):
                Circle(SKETCH13_R_2)
        extrude(amount=-CUT_EXTRUDE3_DEPTH, mode=Mode.SUBTRACT)

    # Sketch14 → Revolve1 (revolve)
    with SkipClean():  # the faces are left unmerged after this step: merging them gives an invalid solid
        with BuildSketch(Plane(origin=(0, 0, 0), x_dir=(0, 0, -1), z_dir=(1, 0, 0)), mode=Mode.PRIVATE) as revolve1_sk:
            with Locations((-27.023000000000003, -1.5874999999999986)):
                Rectangle(SKETCH14_W, SKETCH14_H)
        revolve(revolve1_sk.sketch.rotate(Axis((0, 25.4, 0), (0, -1, 0)), 156.91836179), axis=Axis((0, 25.4, 0), (0, -1, 0)))

    # Chamfer1
    # the kernel refuses this chamfer: 3.5, 2.020725942 mm, written as the material it adds along each edge
    with BuildSketch(Plane(origin=(0, 0, 0), x_dir=(-2.1e-16, 0, 1), z_dir=(1, 0, 2.1e-16))) as chamfer1_piece_1_section:
        Polygon((25.273, -CHAMFER1_SIZE), (25.273000000000007 + CHAMFER1_SIZE_2, 0), (25.273000000000007, 0), align=None)
    chamfer1_piece_1 = revolve(axis=Axis((0, 0, 0), (0, -1, 0)), revolution_arc=156.91836178999998, mode=Mode.PRIVATE)
    chamfer1_piece_1 = chamfer1_piece_1 & Plane(origin=(0, 0.988052825602503, 0), x_dir=(-0.39204231787014937, 0, -0.9199471838094841), z_dir=(0, -1, 0)) * Cylinder(28.773, 116, mode=Mode.PRIVATE)
    add(chamfer1_piece_1)
    with BuildSketch(Plane(origin=(0, 0, 0), x_dir=(-1.8e-16, 0, 1), z_dir=(-1, 0, -1.8e-16))) as chamfer1_piece_2_section:
        Polygon((25.273, CHAMFER1_SIZE), (25.273 + CHAMFER1_SIZE_2, 0), (25.273, 0), align=None)
    chamfer1_piece_2 = revolve(axis=Axis((0, 0, 0), (0, 1, 0)), revolution_arc=180, mode=Mode.PRIVATE)
    chamfer1_piece_2 = chamfer1_piece_2 & Plane(origin=(0, 0.9853703609509775, 0), x_dir=(-0.39204231787014937, 0, -0.9199471838094841), z_dir=(0, -1, 0)) * Cylinder(28.773, 116, mode=Mode.PRIVATE)
    add(chamfer1_piece_2)
    with BuildSketch(Plane(origin=(0, 0, 0), x_dir=(-0.39204231787014926, 0, -0.919947183809484), z_dir=(-0.919947183809484, 0, 0.39204231787014926))) as chamfer1_piece_3_section:
        Polygon((25.272999999999993, -CHAMFER1_SIZE), (25.273000000000003 + CHAMFER1_SIZE_2, 0), (25.273000000000003, 0), align=None)
    chamfer1_piece_3 = revolve(axis=Axis((0, 0, 0), (0, -1, 0)), revolution_arc=23.08163820999999, mode=Mode.PRIVATE)
    chamfer1_piece_3 = chamfer1_piece_3 & Plane(origin=(0, 0.6408535162382758, 0), x_dir=(-0.39204231787014937, 0, -0.9199471838094841), z_dir=(0, -1, 0)) * Cylinder(28.773, 116, mode=Mode.PRIVATE)
    add(chamfer1_piece_3)


solid = cut_extrude1_piece_1_1.part
